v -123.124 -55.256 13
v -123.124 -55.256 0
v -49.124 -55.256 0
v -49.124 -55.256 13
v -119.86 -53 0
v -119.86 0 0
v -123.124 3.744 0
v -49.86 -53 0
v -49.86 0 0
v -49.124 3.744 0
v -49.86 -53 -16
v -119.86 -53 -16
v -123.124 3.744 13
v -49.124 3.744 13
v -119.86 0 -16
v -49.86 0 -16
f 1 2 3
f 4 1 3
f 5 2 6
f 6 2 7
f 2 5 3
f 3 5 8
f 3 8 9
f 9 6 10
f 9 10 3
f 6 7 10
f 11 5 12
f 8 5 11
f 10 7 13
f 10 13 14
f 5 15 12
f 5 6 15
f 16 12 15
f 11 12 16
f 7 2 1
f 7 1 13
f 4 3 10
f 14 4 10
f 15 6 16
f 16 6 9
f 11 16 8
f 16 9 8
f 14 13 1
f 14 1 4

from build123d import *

# Parameters (mm, degrees)
F0_W      = 74
F0_H      = 59
F1_DEPTH  = 13
F2_W      = 70
F2_H      = 53
F3_DEPTH  = 3
F3_FACE_W = 70
F3_FACE_H = 53
F4_DEPTH  = 13


with BuildPart() as f1:
    # F0 (on Top) → F1 (new body)
    with BuildSketch(Plane.XY):
        with Locations((-86.124225, -25.756026)):
            Rectangle(F0_W, F0_H)
    extrude(amount=F1_DEPTH)

    # F2 (on Top) → F3 (join)
    with BuildSketch(Plane.XY):
        with Locations((-84.860367, -26.5)):
            Rectangle(F2_W, F2_H)
    extrude(amount=-F3_DEPTH)

    # F3_face (on face) → F4 (join)
    with BuildSketch(Plane(origin=(-84.860367, -26.5, -3), x_dir=(1, 0, 0), z_dir=(0, 0, -1))):
        Rectangle(F3_FACE_W, F3_FACE_H)
    extrude(amount=F4_DEPTH)


solid = f1.part
